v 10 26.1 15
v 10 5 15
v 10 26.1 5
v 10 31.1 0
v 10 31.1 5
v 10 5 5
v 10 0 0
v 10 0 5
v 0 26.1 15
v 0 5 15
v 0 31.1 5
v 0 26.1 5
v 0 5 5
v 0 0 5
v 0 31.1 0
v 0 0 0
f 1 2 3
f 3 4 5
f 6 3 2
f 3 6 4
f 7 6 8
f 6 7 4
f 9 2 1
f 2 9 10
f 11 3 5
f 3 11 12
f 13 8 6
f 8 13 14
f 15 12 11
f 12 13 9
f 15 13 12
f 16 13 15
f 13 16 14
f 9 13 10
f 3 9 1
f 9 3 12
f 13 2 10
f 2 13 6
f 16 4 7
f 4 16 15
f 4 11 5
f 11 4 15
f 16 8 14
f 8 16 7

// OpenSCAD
/*
Copyright Luke Wallin 2020

This file is part of Luke Wallin's 3DPrintedTrains project.

The 3DPrintedTrains project is free software: you can redistribute it and/or modify
it under the terms of the GNU General Public License as published by
the Free Software Foundation, either version 3 of the License, or
(at your option) any later version.

The 3DPrintedTrains project is distributed in the hope that it will be useful,
but WITHOUT ANY WARRANTY; without even the implied warranty of
MERCHANTABILITY or FITNESS FOR A PARTICULAR PURPOSE.  See the
GNU General Public License for more details.

You should have received a copy of the GNU General Public License
along with The 3DPrintedTrains project.  If not, see <https:www.gnu.org/licenses/>.
*/

axle_and_wheel_length = 3.4*2+14.3;
//block exactly the right height to stop the clamp making the wheels too close together
translate([0,5,5])cube([10,axle_and_wheel_length,10]);
cube([10,axle_and_wheel_length+10,5]);
